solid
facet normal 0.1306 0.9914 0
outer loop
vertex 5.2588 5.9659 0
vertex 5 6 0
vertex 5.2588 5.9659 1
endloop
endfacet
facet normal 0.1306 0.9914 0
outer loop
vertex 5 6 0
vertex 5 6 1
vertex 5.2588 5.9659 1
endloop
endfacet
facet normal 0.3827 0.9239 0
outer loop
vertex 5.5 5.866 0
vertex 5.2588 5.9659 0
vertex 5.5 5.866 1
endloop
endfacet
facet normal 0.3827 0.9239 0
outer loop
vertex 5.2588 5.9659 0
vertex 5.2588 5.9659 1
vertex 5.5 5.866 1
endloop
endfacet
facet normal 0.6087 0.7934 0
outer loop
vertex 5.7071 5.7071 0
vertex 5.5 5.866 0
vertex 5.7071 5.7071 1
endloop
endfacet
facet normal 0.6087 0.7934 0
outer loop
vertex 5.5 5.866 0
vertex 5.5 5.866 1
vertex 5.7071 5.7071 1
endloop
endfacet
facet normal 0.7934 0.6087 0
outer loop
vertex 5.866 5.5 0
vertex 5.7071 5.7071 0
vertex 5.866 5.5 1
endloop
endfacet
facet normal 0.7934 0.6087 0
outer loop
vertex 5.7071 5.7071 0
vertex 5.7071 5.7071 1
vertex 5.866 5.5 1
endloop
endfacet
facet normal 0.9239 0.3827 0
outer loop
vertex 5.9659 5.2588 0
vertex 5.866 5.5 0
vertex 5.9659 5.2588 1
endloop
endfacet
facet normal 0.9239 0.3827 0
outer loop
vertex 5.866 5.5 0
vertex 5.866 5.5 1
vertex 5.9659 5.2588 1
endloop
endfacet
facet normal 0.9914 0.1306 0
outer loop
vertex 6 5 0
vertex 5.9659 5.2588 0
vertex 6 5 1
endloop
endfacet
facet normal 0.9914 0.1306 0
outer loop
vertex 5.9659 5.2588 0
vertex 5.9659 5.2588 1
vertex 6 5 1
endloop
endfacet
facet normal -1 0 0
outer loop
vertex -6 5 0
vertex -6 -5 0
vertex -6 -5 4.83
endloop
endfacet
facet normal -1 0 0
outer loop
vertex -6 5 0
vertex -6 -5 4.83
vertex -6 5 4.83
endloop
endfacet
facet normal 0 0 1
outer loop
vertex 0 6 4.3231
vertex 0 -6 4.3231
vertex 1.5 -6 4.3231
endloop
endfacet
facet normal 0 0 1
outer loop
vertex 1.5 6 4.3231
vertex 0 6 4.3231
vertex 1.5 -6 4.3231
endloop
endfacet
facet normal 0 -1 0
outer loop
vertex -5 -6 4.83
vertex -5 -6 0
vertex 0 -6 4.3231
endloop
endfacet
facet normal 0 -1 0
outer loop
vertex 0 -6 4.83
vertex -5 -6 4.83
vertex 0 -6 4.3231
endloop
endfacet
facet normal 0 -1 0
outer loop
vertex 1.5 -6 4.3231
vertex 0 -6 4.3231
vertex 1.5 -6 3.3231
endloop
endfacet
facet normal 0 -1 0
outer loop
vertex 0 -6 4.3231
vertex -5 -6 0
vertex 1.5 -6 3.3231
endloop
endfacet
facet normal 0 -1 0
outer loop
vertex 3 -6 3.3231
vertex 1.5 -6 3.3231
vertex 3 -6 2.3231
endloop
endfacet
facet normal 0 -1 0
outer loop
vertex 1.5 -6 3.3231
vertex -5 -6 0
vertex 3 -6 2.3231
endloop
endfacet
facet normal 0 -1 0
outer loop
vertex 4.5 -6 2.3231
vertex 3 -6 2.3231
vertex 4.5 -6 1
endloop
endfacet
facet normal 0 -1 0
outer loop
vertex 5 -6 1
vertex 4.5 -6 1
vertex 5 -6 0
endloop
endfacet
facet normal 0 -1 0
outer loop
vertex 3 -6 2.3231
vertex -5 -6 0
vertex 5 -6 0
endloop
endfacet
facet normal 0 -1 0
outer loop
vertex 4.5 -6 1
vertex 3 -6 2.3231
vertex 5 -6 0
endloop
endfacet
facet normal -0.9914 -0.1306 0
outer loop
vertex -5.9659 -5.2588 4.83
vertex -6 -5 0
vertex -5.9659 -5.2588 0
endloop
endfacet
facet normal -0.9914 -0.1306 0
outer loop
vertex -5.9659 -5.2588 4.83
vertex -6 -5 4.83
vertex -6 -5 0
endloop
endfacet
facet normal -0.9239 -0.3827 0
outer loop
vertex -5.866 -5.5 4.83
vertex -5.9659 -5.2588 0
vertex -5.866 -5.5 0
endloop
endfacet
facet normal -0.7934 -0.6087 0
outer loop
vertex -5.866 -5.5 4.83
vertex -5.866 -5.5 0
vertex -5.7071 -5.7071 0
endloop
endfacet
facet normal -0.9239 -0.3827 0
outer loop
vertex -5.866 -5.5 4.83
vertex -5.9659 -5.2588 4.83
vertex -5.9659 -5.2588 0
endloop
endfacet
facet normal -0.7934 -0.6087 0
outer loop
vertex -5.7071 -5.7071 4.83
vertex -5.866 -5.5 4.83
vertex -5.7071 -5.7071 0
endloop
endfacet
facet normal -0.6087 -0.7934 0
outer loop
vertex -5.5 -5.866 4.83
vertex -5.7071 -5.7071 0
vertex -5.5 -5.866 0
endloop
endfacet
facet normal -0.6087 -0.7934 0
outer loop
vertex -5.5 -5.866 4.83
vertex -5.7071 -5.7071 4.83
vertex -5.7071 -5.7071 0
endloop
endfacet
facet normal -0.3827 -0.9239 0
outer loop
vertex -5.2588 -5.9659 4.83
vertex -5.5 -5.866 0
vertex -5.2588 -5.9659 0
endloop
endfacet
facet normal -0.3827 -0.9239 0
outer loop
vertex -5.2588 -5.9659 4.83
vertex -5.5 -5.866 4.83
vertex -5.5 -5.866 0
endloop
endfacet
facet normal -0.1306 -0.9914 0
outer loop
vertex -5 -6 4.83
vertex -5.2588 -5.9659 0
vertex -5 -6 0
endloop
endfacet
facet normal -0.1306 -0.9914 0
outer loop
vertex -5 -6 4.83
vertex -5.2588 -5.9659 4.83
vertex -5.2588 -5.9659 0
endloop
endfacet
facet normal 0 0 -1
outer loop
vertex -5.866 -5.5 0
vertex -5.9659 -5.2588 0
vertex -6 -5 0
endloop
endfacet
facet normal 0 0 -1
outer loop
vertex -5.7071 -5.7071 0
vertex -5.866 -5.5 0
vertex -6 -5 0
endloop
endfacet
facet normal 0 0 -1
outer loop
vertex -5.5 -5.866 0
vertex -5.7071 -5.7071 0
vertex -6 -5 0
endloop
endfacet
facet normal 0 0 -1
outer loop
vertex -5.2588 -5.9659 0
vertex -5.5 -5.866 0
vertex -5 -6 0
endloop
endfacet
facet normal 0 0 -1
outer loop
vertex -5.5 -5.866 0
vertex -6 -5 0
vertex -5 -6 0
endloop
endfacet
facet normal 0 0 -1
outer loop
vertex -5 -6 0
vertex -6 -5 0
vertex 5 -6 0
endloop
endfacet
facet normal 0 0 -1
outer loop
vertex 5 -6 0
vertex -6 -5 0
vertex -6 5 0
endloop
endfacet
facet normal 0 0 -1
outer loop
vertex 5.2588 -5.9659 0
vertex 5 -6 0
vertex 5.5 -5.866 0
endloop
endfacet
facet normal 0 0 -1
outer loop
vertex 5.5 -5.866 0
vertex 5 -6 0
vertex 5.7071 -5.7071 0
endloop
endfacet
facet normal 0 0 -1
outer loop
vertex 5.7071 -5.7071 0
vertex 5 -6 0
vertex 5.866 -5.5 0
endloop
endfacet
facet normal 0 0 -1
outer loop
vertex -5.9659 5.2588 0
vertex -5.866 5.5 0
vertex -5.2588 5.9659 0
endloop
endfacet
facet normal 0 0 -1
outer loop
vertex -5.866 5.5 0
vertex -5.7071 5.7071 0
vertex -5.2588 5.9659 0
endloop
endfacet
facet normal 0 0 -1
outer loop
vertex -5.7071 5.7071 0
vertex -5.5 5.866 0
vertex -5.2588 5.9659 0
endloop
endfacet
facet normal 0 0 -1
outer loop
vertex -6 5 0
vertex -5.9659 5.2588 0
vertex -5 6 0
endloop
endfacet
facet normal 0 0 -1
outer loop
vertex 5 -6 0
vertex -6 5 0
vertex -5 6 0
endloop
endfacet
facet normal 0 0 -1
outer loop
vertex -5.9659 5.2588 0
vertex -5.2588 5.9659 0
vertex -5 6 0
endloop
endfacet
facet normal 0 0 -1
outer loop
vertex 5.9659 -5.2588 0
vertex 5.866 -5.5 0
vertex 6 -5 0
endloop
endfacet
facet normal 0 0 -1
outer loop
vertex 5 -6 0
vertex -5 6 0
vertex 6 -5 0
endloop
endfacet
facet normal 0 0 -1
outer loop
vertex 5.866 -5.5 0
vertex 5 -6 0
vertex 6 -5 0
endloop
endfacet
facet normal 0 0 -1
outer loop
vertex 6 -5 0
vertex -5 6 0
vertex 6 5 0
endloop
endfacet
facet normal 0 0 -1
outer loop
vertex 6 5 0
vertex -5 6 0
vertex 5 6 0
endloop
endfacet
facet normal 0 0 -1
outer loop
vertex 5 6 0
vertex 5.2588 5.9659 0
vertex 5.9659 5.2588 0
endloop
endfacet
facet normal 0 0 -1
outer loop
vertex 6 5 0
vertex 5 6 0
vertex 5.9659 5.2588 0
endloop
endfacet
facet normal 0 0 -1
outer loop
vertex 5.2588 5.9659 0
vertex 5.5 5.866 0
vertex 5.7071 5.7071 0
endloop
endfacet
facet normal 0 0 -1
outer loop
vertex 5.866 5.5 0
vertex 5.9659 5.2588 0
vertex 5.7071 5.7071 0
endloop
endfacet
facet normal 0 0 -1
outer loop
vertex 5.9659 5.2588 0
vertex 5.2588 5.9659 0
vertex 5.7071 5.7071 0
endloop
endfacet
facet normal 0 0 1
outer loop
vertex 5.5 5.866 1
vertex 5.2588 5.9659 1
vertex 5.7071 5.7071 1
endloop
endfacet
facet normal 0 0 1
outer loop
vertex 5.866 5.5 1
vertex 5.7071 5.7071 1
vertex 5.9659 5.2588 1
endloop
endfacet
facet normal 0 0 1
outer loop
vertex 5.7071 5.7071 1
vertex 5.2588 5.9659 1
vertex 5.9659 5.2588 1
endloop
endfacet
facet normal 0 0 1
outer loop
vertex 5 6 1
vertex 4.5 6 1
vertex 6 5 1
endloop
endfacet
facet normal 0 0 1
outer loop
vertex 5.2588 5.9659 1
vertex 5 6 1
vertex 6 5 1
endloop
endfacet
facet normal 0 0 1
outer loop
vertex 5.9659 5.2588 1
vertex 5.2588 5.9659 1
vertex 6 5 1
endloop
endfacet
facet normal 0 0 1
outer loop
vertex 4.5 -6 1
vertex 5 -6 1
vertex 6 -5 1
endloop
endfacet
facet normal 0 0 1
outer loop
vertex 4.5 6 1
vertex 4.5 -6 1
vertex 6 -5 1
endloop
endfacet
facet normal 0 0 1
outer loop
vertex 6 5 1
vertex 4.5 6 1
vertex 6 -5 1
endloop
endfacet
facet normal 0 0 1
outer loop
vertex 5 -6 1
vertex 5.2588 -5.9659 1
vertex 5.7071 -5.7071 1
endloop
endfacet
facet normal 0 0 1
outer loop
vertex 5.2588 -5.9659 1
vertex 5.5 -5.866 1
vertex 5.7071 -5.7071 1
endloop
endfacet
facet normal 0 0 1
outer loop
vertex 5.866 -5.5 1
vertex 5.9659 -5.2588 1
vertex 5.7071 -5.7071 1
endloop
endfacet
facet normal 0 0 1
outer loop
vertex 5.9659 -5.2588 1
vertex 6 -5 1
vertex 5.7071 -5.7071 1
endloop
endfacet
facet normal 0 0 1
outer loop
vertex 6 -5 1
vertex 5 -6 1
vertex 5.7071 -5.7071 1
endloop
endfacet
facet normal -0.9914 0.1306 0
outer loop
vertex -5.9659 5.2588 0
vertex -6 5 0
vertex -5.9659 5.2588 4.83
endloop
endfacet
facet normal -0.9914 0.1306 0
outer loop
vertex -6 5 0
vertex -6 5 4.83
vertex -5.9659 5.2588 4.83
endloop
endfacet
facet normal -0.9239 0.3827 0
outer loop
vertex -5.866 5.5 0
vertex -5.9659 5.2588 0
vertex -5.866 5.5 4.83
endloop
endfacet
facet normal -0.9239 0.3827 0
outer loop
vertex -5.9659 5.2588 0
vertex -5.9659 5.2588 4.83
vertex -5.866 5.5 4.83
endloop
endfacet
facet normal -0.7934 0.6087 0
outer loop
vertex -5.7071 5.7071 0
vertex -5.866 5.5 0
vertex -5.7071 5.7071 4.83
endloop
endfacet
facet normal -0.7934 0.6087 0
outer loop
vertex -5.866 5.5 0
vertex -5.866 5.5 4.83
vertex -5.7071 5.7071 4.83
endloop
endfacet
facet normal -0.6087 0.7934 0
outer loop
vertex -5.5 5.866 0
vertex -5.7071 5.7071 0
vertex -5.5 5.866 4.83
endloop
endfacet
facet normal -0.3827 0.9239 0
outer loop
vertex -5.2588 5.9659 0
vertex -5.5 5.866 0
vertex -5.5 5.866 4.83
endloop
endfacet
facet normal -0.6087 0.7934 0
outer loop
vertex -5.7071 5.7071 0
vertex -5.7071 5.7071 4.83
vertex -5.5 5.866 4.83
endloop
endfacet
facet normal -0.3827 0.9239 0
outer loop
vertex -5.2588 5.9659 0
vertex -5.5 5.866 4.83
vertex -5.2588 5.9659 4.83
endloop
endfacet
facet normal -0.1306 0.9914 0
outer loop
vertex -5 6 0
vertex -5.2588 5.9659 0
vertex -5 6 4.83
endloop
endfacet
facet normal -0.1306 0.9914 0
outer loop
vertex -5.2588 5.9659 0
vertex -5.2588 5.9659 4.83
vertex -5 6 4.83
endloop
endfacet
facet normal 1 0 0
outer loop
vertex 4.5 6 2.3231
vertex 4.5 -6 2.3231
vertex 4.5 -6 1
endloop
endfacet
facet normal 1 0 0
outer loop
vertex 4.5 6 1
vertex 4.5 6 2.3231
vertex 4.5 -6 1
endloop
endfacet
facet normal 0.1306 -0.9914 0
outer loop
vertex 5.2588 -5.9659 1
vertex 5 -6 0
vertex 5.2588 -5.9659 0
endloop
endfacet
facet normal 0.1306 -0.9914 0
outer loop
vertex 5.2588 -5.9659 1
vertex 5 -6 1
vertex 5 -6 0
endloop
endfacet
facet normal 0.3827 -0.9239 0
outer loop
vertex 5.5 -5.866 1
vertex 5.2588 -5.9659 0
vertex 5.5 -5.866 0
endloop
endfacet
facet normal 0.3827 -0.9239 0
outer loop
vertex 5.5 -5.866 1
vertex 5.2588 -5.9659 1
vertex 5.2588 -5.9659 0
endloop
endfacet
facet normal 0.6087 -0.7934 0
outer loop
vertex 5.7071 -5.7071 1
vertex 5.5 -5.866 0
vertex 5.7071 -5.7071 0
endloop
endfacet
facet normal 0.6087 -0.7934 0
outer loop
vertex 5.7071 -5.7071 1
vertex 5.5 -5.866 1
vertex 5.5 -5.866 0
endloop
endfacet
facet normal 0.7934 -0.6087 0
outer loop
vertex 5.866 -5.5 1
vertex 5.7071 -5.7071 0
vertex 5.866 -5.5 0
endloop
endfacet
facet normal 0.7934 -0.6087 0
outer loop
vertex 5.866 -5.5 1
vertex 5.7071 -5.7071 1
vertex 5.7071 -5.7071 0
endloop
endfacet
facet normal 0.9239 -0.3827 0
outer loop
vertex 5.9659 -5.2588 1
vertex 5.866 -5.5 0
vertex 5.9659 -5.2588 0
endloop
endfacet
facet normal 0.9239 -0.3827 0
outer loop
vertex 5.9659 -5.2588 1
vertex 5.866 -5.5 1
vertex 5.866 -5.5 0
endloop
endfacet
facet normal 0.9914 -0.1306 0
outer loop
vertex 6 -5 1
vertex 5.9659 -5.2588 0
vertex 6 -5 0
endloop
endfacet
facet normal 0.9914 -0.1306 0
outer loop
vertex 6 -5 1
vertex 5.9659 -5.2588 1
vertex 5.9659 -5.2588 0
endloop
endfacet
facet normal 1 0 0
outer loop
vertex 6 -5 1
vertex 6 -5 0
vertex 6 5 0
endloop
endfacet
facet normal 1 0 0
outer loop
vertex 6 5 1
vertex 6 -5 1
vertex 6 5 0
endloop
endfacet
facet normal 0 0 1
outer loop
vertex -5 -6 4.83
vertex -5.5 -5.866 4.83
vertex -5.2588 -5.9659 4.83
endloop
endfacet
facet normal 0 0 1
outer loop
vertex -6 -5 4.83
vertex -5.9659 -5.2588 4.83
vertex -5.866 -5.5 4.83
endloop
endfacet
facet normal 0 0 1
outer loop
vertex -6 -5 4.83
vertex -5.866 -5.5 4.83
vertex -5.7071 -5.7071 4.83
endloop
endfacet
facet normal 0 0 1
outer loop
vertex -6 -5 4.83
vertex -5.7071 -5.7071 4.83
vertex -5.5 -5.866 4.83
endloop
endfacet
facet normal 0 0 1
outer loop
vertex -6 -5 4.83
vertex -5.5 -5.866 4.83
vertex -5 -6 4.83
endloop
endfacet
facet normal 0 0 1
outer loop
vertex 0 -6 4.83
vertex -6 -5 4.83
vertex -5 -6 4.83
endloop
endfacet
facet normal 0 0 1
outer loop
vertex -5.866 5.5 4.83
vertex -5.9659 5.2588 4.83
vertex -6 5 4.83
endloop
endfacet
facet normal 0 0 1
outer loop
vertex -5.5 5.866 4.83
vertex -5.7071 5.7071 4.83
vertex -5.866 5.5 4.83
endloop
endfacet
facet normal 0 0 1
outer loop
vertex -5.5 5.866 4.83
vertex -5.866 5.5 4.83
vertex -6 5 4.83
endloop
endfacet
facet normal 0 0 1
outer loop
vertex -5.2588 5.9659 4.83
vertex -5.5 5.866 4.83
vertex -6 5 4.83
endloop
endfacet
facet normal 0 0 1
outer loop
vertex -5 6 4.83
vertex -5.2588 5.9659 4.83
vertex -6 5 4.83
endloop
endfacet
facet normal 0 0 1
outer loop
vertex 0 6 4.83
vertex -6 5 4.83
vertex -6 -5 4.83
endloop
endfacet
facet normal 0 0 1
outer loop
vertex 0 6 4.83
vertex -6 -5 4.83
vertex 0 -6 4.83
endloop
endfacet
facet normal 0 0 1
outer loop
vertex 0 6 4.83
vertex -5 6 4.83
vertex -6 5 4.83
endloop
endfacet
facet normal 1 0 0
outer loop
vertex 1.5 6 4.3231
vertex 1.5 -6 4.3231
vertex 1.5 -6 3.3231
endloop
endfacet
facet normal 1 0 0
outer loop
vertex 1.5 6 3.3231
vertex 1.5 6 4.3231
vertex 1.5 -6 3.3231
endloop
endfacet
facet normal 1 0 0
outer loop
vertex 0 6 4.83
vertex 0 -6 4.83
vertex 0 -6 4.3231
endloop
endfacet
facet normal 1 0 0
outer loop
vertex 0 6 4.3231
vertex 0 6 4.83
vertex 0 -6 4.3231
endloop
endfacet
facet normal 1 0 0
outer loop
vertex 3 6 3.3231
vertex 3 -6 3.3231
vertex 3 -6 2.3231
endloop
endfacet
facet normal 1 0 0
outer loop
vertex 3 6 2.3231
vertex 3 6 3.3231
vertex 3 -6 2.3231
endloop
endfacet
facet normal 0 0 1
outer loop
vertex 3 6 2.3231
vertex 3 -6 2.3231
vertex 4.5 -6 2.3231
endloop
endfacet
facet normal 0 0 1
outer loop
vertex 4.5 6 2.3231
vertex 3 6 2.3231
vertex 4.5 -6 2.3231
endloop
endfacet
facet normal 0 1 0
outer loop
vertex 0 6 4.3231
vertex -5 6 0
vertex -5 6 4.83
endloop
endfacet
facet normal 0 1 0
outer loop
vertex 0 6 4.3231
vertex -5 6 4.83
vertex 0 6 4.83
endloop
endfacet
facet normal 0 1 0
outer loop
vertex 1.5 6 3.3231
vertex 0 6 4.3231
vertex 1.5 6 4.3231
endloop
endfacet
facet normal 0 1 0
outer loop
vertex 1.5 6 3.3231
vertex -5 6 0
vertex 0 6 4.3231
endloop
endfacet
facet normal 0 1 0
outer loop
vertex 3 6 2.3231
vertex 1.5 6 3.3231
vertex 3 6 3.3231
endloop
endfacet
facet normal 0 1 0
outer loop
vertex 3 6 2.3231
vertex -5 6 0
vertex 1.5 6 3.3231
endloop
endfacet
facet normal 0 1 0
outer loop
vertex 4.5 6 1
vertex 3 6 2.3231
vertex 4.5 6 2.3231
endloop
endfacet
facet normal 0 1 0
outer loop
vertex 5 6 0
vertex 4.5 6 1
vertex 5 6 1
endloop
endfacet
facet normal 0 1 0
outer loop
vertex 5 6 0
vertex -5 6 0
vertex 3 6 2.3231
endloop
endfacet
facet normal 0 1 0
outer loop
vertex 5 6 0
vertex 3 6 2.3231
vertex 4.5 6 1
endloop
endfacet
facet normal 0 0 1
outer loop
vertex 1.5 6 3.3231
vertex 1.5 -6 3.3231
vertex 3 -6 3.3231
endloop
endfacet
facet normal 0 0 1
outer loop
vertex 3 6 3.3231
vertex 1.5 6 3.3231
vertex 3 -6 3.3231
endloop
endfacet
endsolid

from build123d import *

# Parameters (mm, degrees)
F0_W     = 12
F0_H     = 12
F1_DEPTH = 4.83
F3_DEPTH = 25
F4_R     = 1


with BuildPart() as f1:
    # F0 (on Top) → F1 (new body)
    with BuildSketch(Plane.XY):
        Rectangle(F0_W, F0_H)
    extrude(amount=F1_DEPTH)

    # F2 (on face) → F3 (cut)
    with BuildSketch(Plane.XZ.offset(6)):
        Polygon((4.5, 2.323068), (4.5, 1), (6, 1), (6, 4.83), (0, 4.83), (0, 4.323068), (1.5, 4.323068), (1.5, 3.323068), (3, 3.323068), (3, 2.323068), align=None)
    extrude(amount=-F3_DEPTH, mode=Mode.SUBTRACT)

    # F4
    f4_edges = [f1.edges().sort_by_distance(p)[0] for p in [
        (-6, -6, 2.415),
        (-6, 6, 2.415),
        (6, -6, 0.5),
        (6, 6, 0.5),
    ]]
    fillet(f4_edges, radius=F4_R)


solid = f1.part
